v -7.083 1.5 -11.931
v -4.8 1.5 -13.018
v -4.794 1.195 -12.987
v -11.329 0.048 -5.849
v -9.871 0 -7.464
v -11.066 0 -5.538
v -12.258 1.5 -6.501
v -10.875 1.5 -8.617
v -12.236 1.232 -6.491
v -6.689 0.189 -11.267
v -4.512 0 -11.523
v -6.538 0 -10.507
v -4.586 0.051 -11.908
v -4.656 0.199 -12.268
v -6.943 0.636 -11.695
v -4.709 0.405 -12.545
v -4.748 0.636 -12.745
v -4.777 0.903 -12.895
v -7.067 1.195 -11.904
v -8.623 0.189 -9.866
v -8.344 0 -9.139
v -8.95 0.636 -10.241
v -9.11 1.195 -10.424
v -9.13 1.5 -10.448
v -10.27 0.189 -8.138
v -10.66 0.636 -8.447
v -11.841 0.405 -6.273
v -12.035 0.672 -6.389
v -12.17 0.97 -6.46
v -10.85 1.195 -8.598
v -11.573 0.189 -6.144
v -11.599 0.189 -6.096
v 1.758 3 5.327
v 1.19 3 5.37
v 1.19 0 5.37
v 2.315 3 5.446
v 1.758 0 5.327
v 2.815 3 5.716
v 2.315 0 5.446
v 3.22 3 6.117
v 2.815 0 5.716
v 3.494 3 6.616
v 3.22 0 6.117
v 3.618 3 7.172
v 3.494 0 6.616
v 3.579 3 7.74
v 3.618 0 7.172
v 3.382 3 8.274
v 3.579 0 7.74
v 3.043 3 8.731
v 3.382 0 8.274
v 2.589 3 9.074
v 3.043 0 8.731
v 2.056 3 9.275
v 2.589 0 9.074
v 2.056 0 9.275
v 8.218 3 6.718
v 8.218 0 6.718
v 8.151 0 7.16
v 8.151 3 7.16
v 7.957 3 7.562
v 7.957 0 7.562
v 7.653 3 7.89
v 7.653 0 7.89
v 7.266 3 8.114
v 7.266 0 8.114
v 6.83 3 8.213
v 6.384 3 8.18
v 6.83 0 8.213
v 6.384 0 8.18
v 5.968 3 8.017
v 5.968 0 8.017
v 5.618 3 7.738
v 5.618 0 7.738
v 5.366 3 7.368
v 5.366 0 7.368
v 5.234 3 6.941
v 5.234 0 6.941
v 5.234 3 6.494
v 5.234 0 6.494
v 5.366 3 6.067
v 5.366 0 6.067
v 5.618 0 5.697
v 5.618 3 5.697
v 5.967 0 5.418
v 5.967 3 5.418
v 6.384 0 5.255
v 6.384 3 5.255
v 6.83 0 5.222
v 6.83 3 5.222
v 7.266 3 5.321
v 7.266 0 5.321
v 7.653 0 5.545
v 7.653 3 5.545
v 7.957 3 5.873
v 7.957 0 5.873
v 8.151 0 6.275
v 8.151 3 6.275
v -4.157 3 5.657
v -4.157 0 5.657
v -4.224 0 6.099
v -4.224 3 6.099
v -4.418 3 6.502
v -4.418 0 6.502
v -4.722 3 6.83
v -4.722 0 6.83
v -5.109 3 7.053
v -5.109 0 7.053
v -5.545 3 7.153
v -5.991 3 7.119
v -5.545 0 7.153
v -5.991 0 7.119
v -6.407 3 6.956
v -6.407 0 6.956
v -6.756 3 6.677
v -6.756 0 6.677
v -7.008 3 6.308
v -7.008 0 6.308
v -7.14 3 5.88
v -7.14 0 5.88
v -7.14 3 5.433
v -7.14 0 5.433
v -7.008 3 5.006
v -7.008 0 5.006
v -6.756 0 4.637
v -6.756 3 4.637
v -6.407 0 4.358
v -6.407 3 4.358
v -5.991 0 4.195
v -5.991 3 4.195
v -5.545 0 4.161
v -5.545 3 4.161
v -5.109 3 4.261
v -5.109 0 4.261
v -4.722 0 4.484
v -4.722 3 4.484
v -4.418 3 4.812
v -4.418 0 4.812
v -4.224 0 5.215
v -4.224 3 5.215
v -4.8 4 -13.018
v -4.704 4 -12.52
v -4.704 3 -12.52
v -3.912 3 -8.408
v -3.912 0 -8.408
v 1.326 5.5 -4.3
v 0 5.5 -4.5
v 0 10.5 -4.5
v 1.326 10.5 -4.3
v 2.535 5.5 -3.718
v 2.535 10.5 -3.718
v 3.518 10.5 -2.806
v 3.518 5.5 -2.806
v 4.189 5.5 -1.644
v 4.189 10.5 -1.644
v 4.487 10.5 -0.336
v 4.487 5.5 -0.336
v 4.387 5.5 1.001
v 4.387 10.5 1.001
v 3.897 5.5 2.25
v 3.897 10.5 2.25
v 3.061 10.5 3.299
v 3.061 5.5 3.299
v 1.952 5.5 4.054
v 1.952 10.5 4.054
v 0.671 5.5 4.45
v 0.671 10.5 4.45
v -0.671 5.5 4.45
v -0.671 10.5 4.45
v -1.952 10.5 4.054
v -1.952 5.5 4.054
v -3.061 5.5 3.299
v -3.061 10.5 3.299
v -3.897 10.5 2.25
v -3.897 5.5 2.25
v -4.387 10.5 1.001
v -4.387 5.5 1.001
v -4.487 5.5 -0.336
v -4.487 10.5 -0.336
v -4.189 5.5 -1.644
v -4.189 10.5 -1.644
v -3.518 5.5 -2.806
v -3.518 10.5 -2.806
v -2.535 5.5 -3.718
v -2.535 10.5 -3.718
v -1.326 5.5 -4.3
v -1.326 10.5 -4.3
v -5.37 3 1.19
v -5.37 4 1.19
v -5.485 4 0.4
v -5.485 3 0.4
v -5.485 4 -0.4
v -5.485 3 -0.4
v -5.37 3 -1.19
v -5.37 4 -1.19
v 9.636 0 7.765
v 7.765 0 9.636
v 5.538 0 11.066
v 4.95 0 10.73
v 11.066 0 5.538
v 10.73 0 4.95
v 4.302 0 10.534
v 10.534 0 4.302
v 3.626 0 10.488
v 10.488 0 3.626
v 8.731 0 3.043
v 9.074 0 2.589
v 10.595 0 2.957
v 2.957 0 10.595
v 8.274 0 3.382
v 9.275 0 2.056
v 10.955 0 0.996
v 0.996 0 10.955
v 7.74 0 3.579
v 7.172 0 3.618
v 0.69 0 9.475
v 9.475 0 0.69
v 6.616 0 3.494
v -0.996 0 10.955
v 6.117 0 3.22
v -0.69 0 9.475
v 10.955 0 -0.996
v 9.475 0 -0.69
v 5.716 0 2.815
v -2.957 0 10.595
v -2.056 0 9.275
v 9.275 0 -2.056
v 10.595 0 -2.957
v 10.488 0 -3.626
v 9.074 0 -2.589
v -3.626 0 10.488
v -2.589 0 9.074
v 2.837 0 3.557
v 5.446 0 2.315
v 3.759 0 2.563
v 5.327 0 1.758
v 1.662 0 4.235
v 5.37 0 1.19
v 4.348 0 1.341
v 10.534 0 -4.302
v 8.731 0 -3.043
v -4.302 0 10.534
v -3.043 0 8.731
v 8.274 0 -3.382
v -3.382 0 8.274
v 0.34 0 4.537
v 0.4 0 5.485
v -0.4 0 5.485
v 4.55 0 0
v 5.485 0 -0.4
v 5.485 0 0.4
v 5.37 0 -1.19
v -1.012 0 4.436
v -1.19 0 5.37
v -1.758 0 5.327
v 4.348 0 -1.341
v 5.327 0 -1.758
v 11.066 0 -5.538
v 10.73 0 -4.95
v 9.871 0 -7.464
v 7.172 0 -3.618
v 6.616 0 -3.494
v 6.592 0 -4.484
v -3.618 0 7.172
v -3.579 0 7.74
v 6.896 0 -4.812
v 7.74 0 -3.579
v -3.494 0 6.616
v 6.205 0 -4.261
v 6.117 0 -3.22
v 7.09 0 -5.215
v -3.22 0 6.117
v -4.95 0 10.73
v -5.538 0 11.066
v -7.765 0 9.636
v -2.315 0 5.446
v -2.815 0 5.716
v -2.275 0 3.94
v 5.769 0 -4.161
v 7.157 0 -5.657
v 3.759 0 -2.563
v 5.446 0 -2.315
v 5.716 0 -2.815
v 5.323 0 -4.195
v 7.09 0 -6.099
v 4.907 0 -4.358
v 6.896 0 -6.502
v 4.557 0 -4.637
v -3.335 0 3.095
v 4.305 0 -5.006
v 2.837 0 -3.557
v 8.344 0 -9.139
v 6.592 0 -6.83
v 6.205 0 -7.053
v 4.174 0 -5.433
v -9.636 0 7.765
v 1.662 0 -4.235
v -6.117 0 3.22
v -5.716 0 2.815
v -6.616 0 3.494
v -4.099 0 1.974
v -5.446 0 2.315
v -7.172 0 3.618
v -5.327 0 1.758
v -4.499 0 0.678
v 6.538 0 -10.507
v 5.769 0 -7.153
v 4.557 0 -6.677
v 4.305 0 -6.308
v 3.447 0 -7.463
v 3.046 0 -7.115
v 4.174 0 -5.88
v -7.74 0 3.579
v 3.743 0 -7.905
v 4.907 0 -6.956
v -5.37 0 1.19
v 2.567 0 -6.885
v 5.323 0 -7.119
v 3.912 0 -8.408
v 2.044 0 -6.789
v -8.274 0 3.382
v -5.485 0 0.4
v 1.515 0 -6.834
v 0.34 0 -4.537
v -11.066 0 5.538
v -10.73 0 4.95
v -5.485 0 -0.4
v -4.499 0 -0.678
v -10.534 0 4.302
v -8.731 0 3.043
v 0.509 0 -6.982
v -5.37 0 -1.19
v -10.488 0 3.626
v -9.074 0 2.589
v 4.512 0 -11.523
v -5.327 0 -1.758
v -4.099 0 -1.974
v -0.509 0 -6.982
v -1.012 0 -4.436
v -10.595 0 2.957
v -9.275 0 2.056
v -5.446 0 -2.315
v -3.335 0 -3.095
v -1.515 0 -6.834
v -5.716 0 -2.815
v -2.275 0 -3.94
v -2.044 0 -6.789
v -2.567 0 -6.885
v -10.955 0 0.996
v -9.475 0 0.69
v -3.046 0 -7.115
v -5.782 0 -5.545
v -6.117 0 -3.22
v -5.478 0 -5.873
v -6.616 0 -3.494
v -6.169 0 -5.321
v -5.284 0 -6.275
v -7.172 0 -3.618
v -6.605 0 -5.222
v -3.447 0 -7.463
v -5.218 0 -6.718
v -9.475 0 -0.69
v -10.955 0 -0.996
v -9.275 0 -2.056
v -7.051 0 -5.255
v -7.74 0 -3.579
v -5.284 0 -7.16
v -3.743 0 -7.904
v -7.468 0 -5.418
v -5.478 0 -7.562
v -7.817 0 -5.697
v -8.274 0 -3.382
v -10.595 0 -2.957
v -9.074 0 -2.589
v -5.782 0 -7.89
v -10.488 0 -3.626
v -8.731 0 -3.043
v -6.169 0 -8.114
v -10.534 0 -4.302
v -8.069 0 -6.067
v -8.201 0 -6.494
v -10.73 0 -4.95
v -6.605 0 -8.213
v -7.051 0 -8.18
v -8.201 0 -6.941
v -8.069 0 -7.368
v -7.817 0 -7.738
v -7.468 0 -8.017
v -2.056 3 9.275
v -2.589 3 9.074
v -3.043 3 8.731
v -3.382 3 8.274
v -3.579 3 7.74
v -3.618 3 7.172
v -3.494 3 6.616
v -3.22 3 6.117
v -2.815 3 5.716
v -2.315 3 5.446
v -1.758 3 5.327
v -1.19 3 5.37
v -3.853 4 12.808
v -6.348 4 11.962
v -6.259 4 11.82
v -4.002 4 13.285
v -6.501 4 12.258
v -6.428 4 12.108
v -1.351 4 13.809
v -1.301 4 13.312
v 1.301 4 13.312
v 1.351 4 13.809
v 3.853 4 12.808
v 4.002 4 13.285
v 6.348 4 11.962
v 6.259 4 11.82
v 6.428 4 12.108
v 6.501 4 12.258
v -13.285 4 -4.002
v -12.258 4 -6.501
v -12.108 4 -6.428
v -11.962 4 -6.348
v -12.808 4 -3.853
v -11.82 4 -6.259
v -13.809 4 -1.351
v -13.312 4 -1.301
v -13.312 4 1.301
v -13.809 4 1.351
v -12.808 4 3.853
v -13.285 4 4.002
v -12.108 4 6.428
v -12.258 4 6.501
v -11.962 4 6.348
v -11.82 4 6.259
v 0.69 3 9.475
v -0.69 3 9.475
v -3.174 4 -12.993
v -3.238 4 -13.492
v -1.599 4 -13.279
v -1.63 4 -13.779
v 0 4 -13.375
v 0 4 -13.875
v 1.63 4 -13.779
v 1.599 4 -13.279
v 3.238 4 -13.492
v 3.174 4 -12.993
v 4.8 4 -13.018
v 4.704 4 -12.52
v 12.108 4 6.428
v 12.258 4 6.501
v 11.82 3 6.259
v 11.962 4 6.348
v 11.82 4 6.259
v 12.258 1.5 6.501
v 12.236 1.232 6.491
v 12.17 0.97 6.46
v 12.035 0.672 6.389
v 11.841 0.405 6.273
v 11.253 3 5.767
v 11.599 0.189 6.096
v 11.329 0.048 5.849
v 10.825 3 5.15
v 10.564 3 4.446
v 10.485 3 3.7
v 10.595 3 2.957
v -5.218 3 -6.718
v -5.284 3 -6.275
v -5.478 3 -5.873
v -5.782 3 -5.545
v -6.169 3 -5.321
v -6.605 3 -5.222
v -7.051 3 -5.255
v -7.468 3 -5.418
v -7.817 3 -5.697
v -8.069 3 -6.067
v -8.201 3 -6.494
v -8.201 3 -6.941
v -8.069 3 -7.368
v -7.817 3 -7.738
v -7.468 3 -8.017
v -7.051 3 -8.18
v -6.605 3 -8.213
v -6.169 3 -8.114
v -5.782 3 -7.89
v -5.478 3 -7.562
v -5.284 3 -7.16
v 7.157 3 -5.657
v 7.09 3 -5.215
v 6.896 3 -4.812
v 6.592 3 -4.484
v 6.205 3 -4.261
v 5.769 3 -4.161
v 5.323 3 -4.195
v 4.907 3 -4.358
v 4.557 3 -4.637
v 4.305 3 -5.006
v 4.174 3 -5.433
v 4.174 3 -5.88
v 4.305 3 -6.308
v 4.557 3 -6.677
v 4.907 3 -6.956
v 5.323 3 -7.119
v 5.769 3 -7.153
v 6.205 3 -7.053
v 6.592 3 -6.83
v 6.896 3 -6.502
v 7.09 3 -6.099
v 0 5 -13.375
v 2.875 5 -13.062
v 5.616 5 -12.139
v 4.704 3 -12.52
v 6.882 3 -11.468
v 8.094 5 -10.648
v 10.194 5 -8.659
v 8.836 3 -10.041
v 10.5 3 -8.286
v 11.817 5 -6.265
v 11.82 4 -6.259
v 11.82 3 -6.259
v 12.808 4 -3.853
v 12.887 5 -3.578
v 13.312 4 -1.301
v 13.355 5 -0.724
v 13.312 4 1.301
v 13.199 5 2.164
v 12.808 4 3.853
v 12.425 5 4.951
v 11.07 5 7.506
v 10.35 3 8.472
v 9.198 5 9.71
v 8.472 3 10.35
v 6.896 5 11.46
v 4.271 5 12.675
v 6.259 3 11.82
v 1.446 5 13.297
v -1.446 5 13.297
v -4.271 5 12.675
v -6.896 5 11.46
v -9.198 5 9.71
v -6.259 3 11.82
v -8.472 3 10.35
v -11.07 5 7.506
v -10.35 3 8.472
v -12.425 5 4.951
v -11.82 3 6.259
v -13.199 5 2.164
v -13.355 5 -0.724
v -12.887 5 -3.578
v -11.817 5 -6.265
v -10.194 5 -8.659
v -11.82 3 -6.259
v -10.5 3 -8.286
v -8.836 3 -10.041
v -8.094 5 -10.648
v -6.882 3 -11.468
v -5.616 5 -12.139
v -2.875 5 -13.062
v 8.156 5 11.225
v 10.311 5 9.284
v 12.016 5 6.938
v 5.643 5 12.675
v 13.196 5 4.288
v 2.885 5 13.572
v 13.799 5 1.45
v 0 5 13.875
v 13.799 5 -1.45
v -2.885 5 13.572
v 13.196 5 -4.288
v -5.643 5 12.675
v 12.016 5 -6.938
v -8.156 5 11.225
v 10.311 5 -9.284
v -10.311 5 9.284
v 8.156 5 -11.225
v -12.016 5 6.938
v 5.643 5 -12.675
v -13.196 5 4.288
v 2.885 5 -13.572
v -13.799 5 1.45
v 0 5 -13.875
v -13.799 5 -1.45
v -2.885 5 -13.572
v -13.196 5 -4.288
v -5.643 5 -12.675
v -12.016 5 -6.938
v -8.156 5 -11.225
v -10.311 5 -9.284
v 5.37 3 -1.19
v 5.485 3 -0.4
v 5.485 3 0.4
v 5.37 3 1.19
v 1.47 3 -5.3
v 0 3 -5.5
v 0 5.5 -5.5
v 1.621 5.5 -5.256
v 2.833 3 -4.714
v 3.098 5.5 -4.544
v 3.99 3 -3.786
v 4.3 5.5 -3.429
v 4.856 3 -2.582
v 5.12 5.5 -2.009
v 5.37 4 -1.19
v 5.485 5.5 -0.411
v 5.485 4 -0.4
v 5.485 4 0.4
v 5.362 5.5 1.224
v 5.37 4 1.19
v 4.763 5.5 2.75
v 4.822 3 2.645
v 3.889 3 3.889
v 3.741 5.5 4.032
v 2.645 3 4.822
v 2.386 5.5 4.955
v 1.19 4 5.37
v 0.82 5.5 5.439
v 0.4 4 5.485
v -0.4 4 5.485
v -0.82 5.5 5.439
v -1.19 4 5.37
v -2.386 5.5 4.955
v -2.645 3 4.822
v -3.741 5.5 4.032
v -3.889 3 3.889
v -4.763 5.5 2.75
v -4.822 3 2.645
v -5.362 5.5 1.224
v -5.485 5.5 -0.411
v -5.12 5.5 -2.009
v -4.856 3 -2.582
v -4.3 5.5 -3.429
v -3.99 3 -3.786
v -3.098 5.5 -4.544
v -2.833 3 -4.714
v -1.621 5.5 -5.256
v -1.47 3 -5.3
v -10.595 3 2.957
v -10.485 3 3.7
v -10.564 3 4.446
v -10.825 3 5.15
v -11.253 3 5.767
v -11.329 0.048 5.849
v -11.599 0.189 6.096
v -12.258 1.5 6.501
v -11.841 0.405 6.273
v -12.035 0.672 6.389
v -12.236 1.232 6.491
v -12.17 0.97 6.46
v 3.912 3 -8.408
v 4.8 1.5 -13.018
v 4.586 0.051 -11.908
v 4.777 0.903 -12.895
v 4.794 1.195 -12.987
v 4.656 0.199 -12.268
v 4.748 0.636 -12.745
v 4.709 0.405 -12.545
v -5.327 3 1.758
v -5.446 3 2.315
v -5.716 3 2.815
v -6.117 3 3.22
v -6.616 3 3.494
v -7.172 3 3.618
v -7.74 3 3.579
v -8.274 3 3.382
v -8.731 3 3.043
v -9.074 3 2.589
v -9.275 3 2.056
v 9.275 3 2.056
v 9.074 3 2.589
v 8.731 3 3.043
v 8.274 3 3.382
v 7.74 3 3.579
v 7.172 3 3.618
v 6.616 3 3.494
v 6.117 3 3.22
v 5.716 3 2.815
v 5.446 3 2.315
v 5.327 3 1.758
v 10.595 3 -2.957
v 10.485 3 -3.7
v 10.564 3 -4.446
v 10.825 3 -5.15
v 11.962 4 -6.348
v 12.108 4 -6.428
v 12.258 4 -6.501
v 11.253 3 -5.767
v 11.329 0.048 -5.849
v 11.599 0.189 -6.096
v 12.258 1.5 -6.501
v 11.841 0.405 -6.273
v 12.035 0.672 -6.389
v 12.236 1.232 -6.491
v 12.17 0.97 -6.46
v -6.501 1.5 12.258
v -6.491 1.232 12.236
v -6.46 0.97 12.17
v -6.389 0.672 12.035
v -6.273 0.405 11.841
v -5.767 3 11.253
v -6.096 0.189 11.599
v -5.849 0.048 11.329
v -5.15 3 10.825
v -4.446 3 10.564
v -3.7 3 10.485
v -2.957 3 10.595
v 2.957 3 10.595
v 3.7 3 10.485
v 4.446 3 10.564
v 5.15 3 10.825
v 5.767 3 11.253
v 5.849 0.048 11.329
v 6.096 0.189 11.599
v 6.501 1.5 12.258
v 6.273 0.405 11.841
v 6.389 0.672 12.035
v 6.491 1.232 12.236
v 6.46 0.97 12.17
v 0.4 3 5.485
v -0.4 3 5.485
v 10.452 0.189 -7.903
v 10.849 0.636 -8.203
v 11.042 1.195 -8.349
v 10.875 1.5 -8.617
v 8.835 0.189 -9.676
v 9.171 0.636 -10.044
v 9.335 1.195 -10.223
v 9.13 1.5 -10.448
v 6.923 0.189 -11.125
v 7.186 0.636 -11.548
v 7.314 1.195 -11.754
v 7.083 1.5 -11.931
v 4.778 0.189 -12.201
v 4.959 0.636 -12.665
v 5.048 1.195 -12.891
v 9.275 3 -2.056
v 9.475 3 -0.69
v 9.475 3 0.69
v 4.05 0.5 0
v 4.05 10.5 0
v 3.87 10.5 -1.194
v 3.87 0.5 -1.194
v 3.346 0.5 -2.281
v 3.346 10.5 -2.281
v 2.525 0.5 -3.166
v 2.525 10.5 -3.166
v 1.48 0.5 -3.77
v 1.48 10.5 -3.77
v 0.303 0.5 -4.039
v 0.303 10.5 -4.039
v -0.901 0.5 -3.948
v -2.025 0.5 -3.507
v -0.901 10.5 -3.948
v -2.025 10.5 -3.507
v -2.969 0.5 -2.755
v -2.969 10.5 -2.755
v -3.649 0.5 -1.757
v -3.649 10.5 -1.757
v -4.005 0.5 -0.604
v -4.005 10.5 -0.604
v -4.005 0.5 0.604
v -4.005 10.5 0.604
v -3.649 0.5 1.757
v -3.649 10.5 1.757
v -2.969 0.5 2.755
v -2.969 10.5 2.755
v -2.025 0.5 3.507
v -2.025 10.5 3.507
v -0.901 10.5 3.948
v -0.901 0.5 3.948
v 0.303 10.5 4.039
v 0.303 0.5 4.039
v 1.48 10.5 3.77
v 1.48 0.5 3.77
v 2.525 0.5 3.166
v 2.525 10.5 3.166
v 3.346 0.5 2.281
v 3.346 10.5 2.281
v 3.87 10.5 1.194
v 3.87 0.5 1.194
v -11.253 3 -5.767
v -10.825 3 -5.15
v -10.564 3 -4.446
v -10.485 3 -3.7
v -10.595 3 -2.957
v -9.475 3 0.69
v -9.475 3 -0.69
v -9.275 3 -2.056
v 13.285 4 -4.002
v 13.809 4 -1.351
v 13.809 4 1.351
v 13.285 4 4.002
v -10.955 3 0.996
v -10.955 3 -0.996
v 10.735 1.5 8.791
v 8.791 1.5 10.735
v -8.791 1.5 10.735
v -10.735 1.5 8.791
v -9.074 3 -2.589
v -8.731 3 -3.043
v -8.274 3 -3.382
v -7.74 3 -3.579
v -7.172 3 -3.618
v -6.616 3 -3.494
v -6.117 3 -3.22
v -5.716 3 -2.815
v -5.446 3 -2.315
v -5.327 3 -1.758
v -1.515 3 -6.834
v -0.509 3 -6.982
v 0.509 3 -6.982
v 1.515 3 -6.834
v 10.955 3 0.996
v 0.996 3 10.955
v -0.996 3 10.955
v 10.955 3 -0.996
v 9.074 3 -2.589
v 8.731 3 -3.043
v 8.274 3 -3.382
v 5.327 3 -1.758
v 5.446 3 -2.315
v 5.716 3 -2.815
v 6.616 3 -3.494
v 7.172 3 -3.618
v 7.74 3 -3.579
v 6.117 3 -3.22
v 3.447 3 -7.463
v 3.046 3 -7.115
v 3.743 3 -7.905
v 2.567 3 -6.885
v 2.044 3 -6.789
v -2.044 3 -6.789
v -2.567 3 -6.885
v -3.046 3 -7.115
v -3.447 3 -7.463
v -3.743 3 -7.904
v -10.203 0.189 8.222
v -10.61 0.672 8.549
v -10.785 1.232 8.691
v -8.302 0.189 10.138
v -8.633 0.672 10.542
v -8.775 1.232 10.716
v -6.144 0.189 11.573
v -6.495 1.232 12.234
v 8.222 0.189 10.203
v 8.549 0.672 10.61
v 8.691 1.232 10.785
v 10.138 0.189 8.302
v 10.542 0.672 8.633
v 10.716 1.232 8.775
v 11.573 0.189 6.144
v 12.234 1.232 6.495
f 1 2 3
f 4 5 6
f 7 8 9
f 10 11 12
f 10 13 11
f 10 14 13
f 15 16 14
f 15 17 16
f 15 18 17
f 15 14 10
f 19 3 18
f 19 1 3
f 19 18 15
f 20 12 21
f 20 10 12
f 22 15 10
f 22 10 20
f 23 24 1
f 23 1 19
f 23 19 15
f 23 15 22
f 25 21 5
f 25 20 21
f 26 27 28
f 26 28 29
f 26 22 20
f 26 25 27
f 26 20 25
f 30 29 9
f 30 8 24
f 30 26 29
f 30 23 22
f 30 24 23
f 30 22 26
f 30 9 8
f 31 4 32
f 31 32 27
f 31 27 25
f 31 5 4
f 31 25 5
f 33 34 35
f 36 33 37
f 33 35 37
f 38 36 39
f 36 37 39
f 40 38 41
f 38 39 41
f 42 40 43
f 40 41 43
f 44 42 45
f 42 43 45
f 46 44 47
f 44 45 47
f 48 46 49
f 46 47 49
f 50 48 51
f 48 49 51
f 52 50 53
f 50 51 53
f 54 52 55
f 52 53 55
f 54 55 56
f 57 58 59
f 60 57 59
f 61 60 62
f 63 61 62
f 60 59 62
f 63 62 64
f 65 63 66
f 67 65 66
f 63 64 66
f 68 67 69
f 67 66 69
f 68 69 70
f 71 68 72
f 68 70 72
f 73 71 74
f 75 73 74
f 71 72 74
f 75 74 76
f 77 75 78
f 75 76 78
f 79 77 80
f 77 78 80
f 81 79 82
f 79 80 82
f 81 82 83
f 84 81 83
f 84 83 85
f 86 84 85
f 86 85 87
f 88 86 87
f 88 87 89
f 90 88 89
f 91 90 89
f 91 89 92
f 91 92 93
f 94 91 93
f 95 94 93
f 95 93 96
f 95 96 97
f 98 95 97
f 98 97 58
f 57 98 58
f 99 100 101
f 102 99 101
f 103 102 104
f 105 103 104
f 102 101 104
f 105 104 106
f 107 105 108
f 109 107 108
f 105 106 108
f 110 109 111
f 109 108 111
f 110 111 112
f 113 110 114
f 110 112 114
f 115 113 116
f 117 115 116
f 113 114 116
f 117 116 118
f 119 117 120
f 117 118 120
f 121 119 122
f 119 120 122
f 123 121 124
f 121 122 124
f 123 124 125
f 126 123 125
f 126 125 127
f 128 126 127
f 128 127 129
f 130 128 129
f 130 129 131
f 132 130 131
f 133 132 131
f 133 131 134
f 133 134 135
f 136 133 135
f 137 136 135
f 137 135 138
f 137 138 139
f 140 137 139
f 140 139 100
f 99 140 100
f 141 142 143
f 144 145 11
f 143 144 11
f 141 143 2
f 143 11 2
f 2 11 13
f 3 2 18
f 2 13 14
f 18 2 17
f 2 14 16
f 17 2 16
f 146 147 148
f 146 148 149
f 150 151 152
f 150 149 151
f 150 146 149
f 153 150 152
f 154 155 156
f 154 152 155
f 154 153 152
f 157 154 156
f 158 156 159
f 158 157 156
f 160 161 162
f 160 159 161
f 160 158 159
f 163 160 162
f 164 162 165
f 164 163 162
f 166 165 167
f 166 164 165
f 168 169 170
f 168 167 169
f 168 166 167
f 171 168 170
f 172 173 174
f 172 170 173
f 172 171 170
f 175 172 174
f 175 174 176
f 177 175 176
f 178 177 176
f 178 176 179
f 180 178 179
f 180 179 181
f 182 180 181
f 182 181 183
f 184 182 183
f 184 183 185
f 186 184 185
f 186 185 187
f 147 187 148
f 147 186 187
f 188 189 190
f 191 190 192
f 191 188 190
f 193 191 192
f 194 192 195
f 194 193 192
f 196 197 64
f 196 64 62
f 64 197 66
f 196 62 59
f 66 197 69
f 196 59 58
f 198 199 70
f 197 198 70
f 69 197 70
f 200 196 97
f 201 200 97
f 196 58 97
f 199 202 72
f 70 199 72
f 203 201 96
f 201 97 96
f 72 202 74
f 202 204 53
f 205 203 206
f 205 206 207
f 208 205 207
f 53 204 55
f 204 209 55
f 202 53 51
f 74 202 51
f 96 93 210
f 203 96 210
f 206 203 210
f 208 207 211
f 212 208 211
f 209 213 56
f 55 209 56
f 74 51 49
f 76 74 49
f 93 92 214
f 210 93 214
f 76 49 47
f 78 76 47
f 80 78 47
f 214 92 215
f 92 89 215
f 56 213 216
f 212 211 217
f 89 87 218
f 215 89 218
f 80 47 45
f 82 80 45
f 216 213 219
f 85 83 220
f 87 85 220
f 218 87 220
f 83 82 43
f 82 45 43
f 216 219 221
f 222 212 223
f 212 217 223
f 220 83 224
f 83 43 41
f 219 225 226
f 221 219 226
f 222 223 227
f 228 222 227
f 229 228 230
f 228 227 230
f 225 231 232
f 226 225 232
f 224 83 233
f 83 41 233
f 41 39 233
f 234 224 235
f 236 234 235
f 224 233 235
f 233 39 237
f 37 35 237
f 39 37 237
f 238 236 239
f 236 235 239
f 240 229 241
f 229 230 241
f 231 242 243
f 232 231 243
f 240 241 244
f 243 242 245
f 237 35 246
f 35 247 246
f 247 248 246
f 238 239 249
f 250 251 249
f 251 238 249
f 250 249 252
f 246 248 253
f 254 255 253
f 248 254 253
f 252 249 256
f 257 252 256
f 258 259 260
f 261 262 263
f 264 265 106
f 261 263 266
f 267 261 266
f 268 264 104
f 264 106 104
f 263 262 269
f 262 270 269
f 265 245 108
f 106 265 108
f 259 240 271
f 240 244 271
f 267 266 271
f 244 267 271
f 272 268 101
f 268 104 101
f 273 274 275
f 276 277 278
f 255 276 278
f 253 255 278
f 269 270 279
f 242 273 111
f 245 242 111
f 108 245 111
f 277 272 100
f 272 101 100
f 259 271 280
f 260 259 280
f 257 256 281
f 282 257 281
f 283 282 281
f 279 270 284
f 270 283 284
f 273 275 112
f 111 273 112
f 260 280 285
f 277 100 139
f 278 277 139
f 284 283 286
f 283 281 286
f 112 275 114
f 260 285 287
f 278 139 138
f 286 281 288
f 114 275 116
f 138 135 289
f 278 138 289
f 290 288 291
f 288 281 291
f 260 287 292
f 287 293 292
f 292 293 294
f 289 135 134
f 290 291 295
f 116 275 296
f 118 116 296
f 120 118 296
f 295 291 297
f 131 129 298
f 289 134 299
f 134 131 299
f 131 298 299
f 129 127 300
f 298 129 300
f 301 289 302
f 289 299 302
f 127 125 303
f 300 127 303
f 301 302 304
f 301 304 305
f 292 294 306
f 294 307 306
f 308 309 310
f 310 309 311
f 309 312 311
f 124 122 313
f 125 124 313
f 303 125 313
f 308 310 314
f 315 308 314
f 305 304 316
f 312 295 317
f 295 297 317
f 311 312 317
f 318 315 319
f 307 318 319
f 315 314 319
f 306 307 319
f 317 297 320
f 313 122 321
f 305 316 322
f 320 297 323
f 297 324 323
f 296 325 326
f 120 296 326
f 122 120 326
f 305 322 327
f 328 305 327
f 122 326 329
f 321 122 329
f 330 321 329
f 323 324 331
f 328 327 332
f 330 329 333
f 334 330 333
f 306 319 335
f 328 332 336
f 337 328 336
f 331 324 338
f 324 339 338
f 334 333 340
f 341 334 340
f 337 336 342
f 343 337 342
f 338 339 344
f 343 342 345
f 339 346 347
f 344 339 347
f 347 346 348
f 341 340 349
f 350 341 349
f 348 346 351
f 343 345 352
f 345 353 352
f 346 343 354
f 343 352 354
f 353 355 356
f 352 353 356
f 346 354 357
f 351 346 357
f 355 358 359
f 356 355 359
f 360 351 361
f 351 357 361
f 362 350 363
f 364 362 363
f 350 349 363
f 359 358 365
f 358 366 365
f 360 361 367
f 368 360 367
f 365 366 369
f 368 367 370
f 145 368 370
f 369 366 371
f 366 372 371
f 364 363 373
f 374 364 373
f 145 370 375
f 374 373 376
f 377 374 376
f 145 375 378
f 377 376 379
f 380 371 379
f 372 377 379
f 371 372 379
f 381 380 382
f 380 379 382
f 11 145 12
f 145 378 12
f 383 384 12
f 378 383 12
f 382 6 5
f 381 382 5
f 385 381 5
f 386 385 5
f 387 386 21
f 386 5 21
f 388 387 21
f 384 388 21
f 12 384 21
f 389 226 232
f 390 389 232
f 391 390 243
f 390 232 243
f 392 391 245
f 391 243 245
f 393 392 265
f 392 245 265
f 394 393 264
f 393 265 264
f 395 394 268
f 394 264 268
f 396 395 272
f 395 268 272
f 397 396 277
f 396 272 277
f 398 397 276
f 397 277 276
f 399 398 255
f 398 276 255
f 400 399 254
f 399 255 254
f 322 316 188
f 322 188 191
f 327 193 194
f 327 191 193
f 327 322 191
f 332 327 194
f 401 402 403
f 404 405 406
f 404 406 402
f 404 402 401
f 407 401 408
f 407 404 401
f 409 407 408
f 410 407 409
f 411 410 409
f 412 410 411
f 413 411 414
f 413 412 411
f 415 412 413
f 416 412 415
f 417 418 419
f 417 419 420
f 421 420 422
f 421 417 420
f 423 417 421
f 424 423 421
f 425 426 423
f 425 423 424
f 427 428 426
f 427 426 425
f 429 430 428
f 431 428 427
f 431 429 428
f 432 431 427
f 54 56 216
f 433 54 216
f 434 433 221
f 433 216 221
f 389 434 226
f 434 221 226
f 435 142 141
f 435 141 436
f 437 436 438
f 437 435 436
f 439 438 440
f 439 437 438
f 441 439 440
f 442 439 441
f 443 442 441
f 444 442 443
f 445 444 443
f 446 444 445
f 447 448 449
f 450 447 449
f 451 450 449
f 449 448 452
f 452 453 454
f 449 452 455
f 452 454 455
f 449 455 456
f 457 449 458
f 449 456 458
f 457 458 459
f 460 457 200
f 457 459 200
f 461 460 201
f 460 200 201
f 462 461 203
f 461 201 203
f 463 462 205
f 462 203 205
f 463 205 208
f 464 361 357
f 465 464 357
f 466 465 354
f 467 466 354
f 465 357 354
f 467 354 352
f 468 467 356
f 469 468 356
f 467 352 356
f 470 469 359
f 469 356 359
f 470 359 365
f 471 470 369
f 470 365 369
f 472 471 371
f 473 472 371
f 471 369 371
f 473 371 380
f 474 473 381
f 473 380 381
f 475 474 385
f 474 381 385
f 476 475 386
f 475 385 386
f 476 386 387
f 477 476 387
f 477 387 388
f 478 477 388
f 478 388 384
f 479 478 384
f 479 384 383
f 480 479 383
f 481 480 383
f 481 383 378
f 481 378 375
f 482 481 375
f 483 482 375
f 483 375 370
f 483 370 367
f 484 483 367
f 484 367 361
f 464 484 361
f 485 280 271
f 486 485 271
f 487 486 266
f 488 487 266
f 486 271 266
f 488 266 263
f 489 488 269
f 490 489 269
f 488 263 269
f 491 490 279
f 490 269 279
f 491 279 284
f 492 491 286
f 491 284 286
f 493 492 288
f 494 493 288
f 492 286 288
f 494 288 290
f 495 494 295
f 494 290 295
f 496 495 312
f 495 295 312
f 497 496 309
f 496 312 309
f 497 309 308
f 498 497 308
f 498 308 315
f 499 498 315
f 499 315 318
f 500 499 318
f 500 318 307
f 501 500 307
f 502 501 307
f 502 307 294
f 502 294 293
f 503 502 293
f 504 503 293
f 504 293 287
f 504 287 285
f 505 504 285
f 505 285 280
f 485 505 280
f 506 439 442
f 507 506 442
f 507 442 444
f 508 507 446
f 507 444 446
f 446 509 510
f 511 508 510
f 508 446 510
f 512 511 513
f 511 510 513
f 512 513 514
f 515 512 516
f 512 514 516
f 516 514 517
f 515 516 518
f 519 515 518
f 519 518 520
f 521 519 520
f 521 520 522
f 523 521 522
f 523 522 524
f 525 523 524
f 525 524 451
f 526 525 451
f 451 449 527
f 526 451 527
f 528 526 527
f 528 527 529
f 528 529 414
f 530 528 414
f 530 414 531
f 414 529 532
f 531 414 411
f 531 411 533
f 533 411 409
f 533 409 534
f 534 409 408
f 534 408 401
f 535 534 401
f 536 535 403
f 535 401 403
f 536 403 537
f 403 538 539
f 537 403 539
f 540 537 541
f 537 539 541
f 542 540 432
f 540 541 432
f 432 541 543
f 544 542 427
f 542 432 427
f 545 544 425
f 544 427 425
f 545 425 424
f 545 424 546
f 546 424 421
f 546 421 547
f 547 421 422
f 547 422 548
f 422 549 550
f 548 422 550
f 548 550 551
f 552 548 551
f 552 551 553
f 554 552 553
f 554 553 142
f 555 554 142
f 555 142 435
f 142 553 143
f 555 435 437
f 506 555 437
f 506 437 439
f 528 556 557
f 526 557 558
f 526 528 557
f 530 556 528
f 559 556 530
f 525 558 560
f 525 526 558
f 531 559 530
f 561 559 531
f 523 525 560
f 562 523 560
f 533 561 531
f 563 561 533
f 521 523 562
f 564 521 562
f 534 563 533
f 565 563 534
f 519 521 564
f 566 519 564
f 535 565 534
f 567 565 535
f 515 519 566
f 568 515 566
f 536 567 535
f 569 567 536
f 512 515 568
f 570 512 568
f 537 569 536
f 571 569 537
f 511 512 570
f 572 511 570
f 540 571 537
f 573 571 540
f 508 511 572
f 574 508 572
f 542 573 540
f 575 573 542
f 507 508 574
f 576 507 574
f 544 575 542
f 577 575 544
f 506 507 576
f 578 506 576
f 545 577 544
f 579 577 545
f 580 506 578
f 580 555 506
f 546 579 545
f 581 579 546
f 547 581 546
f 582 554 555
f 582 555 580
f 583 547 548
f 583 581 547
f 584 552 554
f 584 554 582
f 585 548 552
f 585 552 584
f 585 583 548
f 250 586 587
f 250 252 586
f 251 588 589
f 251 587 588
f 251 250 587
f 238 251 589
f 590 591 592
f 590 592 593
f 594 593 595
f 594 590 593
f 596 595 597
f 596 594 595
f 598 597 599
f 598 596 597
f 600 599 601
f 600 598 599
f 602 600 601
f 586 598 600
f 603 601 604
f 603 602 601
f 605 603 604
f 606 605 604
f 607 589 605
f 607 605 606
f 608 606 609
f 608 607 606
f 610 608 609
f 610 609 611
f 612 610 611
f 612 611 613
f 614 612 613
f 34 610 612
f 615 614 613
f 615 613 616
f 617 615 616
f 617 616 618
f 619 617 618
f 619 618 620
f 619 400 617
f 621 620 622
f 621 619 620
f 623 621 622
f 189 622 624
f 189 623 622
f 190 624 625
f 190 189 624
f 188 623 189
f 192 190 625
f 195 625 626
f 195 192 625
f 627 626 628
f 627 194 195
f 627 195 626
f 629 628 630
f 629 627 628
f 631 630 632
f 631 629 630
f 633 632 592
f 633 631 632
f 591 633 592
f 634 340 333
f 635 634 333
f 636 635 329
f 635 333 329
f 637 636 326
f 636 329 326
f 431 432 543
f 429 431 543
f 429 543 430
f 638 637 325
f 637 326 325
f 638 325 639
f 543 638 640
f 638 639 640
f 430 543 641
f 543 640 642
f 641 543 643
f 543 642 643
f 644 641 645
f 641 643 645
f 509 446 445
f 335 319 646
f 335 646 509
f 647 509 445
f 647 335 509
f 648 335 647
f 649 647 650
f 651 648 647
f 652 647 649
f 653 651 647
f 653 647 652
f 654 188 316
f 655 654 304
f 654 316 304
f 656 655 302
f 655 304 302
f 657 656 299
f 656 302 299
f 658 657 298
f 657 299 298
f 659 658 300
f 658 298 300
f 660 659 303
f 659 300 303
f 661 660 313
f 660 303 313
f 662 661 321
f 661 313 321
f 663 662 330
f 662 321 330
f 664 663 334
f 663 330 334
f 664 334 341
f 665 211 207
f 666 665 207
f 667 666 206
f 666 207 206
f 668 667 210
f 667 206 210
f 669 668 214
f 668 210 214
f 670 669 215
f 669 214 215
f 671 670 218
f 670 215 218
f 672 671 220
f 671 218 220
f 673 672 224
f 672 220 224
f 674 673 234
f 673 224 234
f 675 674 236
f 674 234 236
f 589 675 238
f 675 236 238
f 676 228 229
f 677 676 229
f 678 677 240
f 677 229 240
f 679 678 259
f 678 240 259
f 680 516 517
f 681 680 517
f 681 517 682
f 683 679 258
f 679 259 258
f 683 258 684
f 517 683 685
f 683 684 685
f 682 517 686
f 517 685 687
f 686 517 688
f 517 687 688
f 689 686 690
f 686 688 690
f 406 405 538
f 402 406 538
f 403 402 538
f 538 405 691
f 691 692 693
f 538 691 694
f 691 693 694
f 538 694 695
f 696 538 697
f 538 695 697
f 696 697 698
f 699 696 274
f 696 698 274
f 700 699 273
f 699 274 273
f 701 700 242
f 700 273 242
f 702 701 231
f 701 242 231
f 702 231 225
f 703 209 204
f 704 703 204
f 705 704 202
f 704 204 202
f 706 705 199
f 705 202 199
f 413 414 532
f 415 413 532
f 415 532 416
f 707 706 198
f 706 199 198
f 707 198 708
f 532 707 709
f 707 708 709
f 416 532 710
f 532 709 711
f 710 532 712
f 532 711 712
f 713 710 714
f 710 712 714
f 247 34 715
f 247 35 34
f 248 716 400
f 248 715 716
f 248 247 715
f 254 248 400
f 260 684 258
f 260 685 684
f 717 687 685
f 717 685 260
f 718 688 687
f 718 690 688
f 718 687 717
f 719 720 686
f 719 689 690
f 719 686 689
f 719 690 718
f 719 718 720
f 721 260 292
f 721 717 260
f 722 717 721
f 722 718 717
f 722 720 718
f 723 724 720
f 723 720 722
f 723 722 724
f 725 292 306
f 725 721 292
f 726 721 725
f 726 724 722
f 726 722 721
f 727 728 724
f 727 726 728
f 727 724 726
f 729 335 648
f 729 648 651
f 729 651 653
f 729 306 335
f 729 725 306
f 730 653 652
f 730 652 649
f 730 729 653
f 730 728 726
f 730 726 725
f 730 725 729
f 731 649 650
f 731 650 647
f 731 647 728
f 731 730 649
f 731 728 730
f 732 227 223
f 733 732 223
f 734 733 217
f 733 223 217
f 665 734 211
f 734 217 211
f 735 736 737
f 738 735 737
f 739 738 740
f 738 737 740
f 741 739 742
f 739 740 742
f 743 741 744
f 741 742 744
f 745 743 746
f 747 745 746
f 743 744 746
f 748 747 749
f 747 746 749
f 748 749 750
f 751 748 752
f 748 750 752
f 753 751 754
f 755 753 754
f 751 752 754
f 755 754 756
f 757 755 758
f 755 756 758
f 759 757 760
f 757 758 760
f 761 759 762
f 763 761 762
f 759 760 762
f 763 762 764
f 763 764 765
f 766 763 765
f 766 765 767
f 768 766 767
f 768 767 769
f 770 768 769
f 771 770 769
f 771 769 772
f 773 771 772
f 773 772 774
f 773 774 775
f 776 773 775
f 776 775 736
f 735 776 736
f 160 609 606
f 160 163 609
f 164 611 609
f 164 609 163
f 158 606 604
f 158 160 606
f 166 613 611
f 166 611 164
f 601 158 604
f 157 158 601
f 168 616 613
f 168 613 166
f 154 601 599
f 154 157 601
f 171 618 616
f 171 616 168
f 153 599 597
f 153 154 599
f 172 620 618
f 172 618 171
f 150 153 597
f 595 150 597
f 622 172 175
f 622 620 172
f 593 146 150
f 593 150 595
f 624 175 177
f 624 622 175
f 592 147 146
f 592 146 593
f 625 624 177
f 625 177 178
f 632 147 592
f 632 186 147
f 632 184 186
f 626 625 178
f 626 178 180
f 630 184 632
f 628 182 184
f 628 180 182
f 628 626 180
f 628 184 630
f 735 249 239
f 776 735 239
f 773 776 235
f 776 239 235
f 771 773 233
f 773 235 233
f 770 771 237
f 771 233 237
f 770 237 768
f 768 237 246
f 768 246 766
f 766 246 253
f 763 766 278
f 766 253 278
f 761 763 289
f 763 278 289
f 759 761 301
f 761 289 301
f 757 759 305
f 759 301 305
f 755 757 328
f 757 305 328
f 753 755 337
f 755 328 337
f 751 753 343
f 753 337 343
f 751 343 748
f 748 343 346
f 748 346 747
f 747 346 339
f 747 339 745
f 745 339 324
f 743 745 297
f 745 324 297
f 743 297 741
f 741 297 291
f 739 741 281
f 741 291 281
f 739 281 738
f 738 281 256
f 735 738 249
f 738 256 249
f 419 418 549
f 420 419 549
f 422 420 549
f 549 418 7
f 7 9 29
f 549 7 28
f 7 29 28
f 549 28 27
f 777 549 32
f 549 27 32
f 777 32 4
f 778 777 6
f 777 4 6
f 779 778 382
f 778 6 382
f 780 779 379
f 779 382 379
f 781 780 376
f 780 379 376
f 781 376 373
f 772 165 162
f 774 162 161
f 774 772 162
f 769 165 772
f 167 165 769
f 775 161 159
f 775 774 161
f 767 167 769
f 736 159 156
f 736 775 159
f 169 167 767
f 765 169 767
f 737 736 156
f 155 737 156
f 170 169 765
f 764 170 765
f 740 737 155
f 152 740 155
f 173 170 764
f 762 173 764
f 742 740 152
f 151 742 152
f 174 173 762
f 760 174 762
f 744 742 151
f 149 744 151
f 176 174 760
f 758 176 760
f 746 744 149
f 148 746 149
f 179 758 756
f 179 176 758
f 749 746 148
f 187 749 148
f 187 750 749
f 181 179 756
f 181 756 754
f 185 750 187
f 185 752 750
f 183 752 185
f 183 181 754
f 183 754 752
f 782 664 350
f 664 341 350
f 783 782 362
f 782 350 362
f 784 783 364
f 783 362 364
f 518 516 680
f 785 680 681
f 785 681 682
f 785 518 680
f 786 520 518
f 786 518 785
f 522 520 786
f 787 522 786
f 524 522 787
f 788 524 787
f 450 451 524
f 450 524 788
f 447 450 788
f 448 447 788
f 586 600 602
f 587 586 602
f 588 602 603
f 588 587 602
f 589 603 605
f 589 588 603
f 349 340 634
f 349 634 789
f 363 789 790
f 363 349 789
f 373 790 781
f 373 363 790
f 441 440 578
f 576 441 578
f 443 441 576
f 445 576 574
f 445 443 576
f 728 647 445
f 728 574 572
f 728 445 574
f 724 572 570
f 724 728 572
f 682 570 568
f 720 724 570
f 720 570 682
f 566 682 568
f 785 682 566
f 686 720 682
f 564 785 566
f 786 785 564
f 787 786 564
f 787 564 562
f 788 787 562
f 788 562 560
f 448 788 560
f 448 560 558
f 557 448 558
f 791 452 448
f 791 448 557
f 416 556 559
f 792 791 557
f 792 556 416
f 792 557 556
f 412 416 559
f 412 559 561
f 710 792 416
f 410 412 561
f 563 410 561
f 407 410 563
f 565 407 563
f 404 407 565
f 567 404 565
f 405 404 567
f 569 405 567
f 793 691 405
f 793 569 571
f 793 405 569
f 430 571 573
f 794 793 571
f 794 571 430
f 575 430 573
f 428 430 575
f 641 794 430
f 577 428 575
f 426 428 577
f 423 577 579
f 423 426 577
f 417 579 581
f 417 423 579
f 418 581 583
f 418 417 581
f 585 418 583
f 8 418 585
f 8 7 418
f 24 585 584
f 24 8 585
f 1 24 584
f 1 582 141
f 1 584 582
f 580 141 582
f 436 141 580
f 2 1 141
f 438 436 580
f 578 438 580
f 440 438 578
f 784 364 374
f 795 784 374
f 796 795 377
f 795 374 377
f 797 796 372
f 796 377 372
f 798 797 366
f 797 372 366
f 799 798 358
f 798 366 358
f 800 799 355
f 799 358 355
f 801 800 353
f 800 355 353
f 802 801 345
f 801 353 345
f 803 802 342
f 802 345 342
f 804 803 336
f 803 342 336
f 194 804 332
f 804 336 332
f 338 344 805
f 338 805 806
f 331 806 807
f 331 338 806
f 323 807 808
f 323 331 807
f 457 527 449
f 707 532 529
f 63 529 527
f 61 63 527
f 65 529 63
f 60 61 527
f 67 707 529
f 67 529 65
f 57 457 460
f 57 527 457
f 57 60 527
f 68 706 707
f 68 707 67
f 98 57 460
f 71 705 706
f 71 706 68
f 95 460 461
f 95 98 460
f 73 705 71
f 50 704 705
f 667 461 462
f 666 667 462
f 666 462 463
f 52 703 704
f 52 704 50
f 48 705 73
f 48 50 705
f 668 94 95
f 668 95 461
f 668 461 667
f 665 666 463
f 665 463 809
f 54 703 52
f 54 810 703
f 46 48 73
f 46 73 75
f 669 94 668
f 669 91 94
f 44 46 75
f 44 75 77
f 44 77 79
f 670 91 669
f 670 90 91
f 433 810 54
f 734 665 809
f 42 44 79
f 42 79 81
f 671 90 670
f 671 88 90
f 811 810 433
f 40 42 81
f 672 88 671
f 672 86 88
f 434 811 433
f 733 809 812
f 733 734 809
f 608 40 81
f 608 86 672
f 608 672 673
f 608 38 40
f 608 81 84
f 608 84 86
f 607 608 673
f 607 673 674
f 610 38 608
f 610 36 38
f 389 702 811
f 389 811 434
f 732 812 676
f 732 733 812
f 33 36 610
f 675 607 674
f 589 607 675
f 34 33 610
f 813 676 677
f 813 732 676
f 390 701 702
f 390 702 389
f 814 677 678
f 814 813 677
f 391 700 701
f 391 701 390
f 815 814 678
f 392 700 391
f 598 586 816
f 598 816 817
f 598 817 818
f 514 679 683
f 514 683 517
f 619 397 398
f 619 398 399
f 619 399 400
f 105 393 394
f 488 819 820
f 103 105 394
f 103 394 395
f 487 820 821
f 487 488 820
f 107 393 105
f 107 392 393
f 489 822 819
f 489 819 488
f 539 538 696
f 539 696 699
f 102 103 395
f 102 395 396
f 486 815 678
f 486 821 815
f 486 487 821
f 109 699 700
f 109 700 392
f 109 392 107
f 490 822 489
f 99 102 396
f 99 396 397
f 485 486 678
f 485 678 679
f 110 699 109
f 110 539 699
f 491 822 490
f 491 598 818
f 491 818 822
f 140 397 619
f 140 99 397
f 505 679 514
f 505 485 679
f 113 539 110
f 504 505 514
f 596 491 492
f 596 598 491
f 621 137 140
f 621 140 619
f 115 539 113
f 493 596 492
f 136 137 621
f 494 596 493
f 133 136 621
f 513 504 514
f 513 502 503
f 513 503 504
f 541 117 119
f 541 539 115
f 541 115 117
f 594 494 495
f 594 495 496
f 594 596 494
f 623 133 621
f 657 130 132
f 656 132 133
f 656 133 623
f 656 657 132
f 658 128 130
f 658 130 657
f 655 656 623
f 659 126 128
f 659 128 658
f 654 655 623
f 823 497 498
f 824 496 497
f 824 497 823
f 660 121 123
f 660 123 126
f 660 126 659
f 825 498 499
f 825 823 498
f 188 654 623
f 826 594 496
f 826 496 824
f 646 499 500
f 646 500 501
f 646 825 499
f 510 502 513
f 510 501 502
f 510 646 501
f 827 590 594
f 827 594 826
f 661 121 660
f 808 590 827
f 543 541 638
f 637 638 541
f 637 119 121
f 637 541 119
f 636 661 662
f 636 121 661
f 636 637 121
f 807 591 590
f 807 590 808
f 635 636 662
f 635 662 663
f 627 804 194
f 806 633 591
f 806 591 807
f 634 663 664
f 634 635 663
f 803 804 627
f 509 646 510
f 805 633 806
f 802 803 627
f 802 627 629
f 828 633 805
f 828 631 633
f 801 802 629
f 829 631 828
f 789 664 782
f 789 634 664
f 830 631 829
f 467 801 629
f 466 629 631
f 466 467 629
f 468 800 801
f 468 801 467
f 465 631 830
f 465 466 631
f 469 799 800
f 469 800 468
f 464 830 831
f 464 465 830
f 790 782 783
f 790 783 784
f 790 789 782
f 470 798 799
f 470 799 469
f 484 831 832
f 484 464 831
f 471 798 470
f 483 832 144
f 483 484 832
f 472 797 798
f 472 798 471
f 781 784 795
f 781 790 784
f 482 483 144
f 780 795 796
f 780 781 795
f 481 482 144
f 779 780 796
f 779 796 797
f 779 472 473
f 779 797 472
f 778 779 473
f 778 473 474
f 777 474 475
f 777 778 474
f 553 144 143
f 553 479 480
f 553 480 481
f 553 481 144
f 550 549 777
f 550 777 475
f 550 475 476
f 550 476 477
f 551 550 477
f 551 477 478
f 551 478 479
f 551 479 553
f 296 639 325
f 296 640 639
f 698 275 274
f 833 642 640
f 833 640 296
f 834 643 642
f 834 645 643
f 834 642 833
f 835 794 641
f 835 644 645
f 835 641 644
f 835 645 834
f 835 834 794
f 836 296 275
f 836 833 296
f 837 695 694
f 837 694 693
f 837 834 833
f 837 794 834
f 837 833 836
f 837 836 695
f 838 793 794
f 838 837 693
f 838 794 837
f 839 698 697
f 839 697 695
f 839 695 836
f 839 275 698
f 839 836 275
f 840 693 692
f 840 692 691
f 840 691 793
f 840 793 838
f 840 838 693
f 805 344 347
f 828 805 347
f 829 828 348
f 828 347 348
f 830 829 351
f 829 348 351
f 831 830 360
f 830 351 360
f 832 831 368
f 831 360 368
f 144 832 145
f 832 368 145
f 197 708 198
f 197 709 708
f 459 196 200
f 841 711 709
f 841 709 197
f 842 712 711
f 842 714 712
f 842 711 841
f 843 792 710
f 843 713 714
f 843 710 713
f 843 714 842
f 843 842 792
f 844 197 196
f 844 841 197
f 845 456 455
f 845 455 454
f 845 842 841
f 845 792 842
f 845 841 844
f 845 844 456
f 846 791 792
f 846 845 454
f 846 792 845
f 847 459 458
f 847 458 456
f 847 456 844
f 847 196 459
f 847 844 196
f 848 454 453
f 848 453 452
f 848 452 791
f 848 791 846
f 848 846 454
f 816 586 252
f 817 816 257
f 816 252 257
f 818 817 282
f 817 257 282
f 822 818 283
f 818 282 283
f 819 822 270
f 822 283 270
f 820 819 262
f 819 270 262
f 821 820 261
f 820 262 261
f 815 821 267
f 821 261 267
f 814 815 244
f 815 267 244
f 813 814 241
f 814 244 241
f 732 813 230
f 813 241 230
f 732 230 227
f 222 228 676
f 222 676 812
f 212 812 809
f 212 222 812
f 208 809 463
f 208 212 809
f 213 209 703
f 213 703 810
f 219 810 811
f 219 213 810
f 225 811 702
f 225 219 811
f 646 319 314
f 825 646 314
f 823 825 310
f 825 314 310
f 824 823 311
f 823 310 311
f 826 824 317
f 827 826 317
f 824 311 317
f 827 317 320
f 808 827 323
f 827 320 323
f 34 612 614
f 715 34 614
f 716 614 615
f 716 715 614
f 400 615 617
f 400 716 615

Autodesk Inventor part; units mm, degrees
ref_plane "YZ Plane" through (0, 0, 0) normal (1, 0, 0) x (0, 1, 0)
ref_plane "XZ Plane" through (0, 0, 0) normal (0, 1, 0) x (-1, 0, 0)
ref_plane "XY Plane" through (0, 0, 0) normal (0, 0, 1) x (1, 0, 0)
sketch "Sketch1" plane through (0, 0, 0) normal (1, 0, 0) x (0, 1, 0)
  line L0 (0, 0) -> (10.5, 0)
  line L1 (10.5, 0) -> (10.5, -4)
  line L2 (10.5, -4) -> (0, -4)
  line L3 (0, -4) -> (0, 0)
  line L4 (0, -4) -> (10.5, -4)
  line L5 (10.5, -4) -> (10.5, -4.5)
  line L6 (10.5, -4.5) -> (0, -4.5)
  line L7 (0, -4.5) -> (0, -4)
  line L8 (0, -4.5) -> (5.5, -4.5)
  line L9 (5.5, -4.5) -> (5.5, -5.5)
  line L10 (5.5, -5.5) -> (0, -5.5)
  line L11 (0, -5.5) -> (0, -4.5)
  line L12 (0, -5.5) -> (3, -5.5)
  line L13 (3, -5.5) -> (3, -13.875)
  line L14 (3, -13.875) -> (0, -13.875)
  line L15 (0, -13.875) -> (0, -5.5)
  line L16 (3, -13.875) -> (5, -13.875)
  line L17 (5, -13.875) -> (5, -13.375)
  line L18 (5, -13.375) -> (3, -13.375)
  line L19 (3, -13.375) -> (3, -13.875)
  line L20 (6.25, -4) -> (4.25, -4)
  line L21 (4.25, -4) -> (4.25, -3.5)
  line L22 (4.25, -3.5) -> (6.25, -3.5)
  line L23 (6.25, -3.5) -> (6.25, -4)
  line L24 (6.25, -4) -> (6.5, -4)
  line L25 (6.5, -4) -> (6.5, -3.75)
  line L26 (6.5, -3.75) -> (6.25, -3.75)
  line L27 (6.25, -3.75) -> (6.25, -4)
  line L28 (4.25, -4) -> (4, -4)
  line L29 (4, -4) -> (4, -3.75)
  line L30 (4, -3.75) -> (4.25, -3.75)
  line L31 (4.25, -3.75) -> (4.25, -4)
  dimension "d0" = 10.5
  dimension "d1" = 4
  dimension "d2" = 0.5
  dimension "d3" = 5.5
  dimension "d4" = 5.5
  dimension "d5" = 3
  dimension "d6" = 13.875
  dimension "d7" = 2
  dimension "d8" = 0.5
  dimension "d48" = 3.5
  dimension "d49" = 4.25
  dimension "d50" = 4.25
  dimension "d51" = 0.25
  dimension "d52" = 0.25
  dimension "d53" = 0.25
  dimension "d54" = 0.25
revolve "Revolution1" add sketch "Sketch1" angle 360 about axis through (0, 0, 0) along (0, 1, 0) contours L2 L5 L6 L7 | L29 L30 L21 L2 | L6 L9 L10 L11 | L2 L23 L26 L25 | L21 L22 L23 L2 | L10 L13 L14 L15 | L18 L17 L16 L13
fillet "Fillet1" radius 1.5 1 edges at (0, 0, 13.875)
sketch "Sketch2" plane through (0, 0, 0) normal (0, -1, 0) x (1, 0, 0)
  circle A0 centre (0, 0) radius 5.5 construction
  line L0 (0, 0) -> (0, -5.5) construction
  circle A1 centre (0, 0) radius 5.5 projected
  line L1 (0, 0) -> (-8.7504, -8.7504) construction
  circle A2 centre (0, 0) radius 12.375 construction
  circle A3 centre (0, 0) radius 8 construction
  circle A4 centre (0, 0) radius 9.5 construction
  circle A5 centre (-6.7175, -6.7175) radius 1.5
  line L2 (0, 0) -> (-5.6569, 5.6569) construction
  circle A6 centre (-5.6569, 5.6569) radius 1.5
  circle A7 centre (5.6569, -5.6569) radius 1.5
  circle A8 centre (6.7175, 6.7175) radius 1.5
  arc A9 (1.6233, 7.3222) -> (-1.6233, 7.3222) centre (0, 0) ccw construction
  arc A10 (2.0562, 9.2748) -> (-2.0562, 9.2748) centre (0, 0) ccw
  arc A11 (1.1904, 5.3696) -> (-1.1904, 5.3696) centre (0, 0) ccw
  arc A12 (1.1904, 5.3696) -> (2.0562, 9.2748) centre (1.6233, 7.3222) ccw
  arc A13 (-2.0562, 9.2748) -> (-1.1904, 5.3696) centre (-1.6233, 7.3222) ccw
  line L3 (-1.6233, 7.3222) -> (0, 0) construction
  line L4 (0, 0) -> (0, 7.5) construction
  line L5 (1.6233, 7.3222) -> (0, 0) construction
  arc A14 (-5.3696, 1.1904) -> (-9.2748, 2.0562) centre (-7.3222, 1.6233) ccw
  arc A15 (-7.3222, 1.6233) -> (-7.3222, -1.6233) centre (0, 0) ccw construction
  arc A16 (-9.2748, 2.0562) -> (-9.2748, -2.0562) centre (0, 0) ccw
  arc A17 (-9.2748, -2.0562) -> (-5.3696, -1.1904) centre (-7.3222, -1.6233) ccw
  arc A18 (-5.3696, 1.1904) -> (-5.3696, -1.1904) centre (0, 0) ccw
  arc A19 (-1.1904, -5.3696) -> (-2.0562, -9.2748) centre (-1.6233, -7.3222) ccw
  arc A20 (-1.6233, -7.3222) -> (1.6233, -7.3222) centre (0, 0) ccw construction
  arc A21 (-2.0562, -9.2748) -> (2.0562, -9.2748) centre (0, 0) ccw
  arc A22 (2.0562, -9.2748) -> (1.1904, -5.3696) centre (1.6233, -7.3222) ccw
  arc A23 (-1.1904, -5.3696) -> (1.1904, -5.3696) centre (0, 0) ccw
  arc A24 (5.3696, -1.1904) -> (9.2748, -2.0562) centre (7.3222, -1.6233) ccw
  arc A25 (7.3222, -1.6233) -> (7.3222, 1.6233) centre (0, 0) ccw construction
  arc A26 (9.2748, -2.0562) -> (9.2748, 2.0562) centre (0, 0) ccw
  arc A27 (9.2748, 2.0562) -> (5.3696, 1.1904) centre (7.3222, 1.6233) ccw
  arc A28 (5.3696, -1.1904) -> (5.3696, 1.1904) centre (0, 0) ccw
  arc A29 (3.7631, 13.4848) -> (-3.7631, 13.4848) centre (0, 0) ccw construction
  arc A30 (4.5695, 16.3744) -> (-4.5695, 16.3744) centre (0, 0) ccw
  arc A31 (2.9567, 10.5952) -> (-2.9567, 10.5952) centre (0, 0) ccw
  arc A32 (2.9567, 10.5952) -> (4.5695, 16.3744) centre (3.7631, 13.4848) ccw
  arc A33 (-4.5695, 16.3744) -> (-2.9567, 10.5952) centre (-3.7631, 13.4848) ccw
  line L6 (0, 0) -> (6.4128, 12.0779) construction
  arc A34 (10.5952, -2.9567) -> (10.5952, 2.9567) centre (0, 0) ccw
  arc A35 (16.3744, 4.5695) -> (10.5952, 2.9567) centre (13.4848, 3.7631) ccw
  arc A36 (10.5952, -2.9567) -> (16.3744, -4.5695) centre (13.4848, -3.7631) ccw
  arc A37 (16.3744, -4.5695) -> (16.3744, 4.5695) centre (0, 0) ccw
  arc A38 (13.4848, -3.7631) -> (13.4848, 3.7631) centre (0, 0) ccw construction
  arc A39 (-2.9567, -10.5952) -> (2.9567, -10.5952) centre (0, 0) ccw
  arc A40 (4.5695, -16.3744) -> (2.9567, -10.5952) centre (3.7631, -13.4848) ccw
  arc A41 (-2.9567, -10.5952) -> (-4.5695, -16.3744) centre (-3.7631, -13.4848) ccw
  arc A42 (-4.5695, -16.3744) -> (4.5695, -16.3744) centre (0, 0) ccw
  arc A43 (-3.7631, -13.4848) -> (3.7631, -13.4848) centre (0, 0) ccw construction
  arc A44 (-10.5952, 2.9567) -> (-10.5952, -2.9567) centre (0, 0) ccw
  arc A45 (-16.3744, -4.5695) -> (-10.5952, -2.9567) centre (-13.4848, -3.7631) ccw
  arc A46 (-10.5952, 2.9567) -> (-16.3744, 4.5695) centre (-13.4848, 3.7631) ccw
  arc A47 (-16.3744, 4.5695) -> (-16.3744, -4.5695) centre (0, 0) ccw
  arc A48 (-13.4848, 3.7631) -> (-13.4848, -3.7631) centre (0, 0) ccw construction
  circle A49 centre (0, 0) radius 2.25 construction
  arc A50 (-1.948, -8.7867) -> (1.948, -8.7867) centre (0, 0) ccw construction
  arc A51 (-2.3808, -10.7393) -> (2.3808, -10.7393) centre (0, 0) ccw
  arc A52 (-1.5151, -6.8341) -> (1.5151, -6.8341) centre (0, 0) ccw
  arc A53 (-1.5151, -6.8341) -> (-2.3808, -10.7393) centre (-1.948, -8.7867) ccw
  arc A54 (2.3808, -10.7393) -> (1.5151, -6.8341) centre (1.948, -8.7867) ccw
  line L7 (2.2093, 0.4258) -> (5.3775, -16.0134)
  line L8 (-2.2093, 0.4258) -> (-5.3775, -16.0134)
  point P0 (-7.5, 0)
  point P1 (0, -7.5)
  point P2 (7.5, 0)
  point P3 (12.0779, -6.4128)
  point P4 (-6.4128, -12.0779)
  point P5 (-12.0779, 6.4128)
  point P6 (5.3696, 1.1904)
  point P7 (1.1904, 5.3696)
  point P8 (-1.1904, 5.3696)
  point P9 (-5.3696, 1.1904)
  point P10 (-5.3696, -1.1904)
  point P11 (-1.1904, -5.3696)
  point P12 (1.1904, -5.3696)
  point P13 (5.3696, -1.1904)
  point P14 (5.2926, -16.0656)
  point P15 (2.2117, 0.4135)
  point P16 (-2.2117, 0.4135)
  point P17 (4.5121, -11.5231)
  point P18 (-4.5121, -11.5231)
  point P19 (3.9118, -8.4082)
  point P20 (-3.9118, -8.4082)
  dimension "d11" = 11
  dimension "d13" = 16
  dimension "d14" = 19
  dimension "d12" = 45
  dimension "d15" = 3
  dimension "d16" = 3
  dimension "d19" = 360
  dimension "d21" = 4
  dimension "d24" = 25
  dimension "d27" = 360
  dimension "d29" = 11
  dimension "d30" = 3
  dimension "d33" = 360
  dimension "d37" = 4.5
  dimension "d38" = 4
  dimension "d39" = 7
extrude "Extrusion1" cut sketch "Sketch2" against normal blind 4 contours A1 A27 A26 A24 | A1 A13 A10 A12 | L7 A40 A39 A54 | A54 A39 A53 A19 A21 A22 | A1 A17 A16 A14 | A22 A21 A19 A53 A52 A54 | A39 A40 L7 A42 A41 L8 | A39 A41 L8 A53 | A5 | A6 | A7 | A8 | A32 A31 A33 A30 | A34 A35 A37 A36 | A44 A45 A47 A46
thread "Thread1" size "M3x0.5" class "6H" standard "ANSI Metric M Profile" length 3
thread "Thread2" size "M3x0.5" class "6H" standard "ANSI Metric M Profile" length 5.0038
thread "Thread3" size "M3x0.5" class "6H" standard "ANSI Metric M Profile" length 5.0038
thread "Thread4" size "M3x0.5" class "6H" standard "ANSI Metric M Profile" length 5.0038
sketch "Sketch3" plane through (0, 10.5, 0) normal (0, 1, 0) x (1, 0, 0)
  circle A0 centre (0, 0) radius 4.05
  dimension "d55" = 8.1
extrude "Extrusion2" cut sketch "Sketch3" against normal through all
chamfer "Chamfer1" distance 0.5 angle 45 1 edges at (-4.05, 0, 0)
equation "\"d49\" = d50"
properties part number "BASE" material "Aluminum 6061"
